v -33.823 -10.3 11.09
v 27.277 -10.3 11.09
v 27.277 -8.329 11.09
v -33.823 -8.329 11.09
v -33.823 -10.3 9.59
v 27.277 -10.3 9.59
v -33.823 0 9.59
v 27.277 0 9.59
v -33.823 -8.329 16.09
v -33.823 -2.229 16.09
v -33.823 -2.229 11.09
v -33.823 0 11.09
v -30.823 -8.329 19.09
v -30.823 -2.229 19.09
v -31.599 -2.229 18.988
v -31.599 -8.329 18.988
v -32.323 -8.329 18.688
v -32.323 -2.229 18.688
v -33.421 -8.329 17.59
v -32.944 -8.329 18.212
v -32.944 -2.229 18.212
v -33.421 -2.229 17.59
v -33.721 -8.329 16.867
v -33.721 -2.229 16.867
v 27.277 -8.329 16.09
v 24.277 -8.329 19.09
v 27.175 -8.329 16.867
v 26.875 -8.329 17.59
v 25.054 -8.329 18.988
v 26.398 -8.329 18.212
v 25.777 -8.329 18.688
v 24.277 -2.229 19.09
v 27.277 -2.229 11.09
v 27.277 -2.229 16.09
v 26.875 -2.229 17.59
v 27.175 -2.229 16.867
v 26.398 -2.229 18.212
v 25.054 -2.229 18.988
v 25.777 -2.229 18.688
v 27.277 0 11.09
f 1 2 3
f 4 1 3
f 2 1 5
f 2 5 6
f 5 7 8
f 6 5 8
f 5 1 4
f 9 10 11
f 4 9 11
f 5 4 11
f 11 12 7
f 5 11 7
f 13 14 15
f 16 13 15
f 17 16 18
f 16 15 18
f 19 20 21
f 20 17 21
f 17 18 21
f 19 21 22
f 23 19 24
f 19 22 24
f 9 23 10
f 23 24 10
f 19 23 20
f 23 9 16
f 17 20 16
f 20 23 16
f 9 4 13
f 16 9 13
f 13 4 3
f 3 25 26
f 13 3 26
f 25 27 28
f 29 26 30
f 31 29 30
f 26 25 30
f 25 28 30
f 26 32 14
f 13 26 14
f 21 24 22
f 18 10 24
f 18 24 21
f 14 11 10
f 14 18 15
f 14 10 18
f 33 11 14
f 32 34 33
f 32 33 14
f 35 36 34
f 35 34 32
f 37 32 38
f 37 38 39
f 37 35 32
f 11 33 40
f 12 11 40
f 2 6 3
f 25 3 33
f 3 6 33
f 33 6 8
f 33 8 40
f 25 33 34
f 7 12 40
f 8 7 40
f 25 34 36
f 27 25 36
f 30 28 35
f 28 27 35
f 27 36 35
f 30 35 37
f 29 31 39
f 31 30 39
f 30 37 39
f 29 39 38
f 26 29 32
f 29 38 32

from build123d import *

# Parameters (mm, degrees)
F1_DEPTH = 10.3
F2_W     = 2.064651
F2_H     = 8.540146
F2_W_2   = 2.228884
F2_H_2   = 8.727841
F3_DEPTH = 61.101


with BuildPart() as f1:
    # F0 (on Front) → F1 (new body)
    with BuildSketch(Plane.XZ):
        with BuildLine():
            Line((24.277063, 19.090399), (-30.822937, 19.090399))
            ThreePointArc((-30.822937, 19.090399), (-32.944257, 18.211719), (-33.822937, 16.090399))
            Line((-33.822937, 16.090399), (-33.822937, 9.590399))
            Line((-33.822937, 9.590399), (27.277063, 9.590399))
            Line((27.277063, 9.590399), (27.277063, 16.090399))
            ThreePointArc((27.277063, 16.090399), (26.398384, 18.211719), (24.277063, 19.090399))
        make_face()
    extrude(amount=F1_DEPTH)

    # F2 (on face) → F3 (cut, through all)
    with BuildSketch(Plane.YZ.offset(27.277063)):
        with Locations((-9.361314, 15.360472)):
            Rectangle(F2_W, F2_H)
        with Locations((-1.114442, 15.45432)):
            Rectangle(F2_W_2, F2_H_2)
    extrude(amount=-F3_DEPTH, mode=Mode.SUBTRACT)


solid = f1.part
